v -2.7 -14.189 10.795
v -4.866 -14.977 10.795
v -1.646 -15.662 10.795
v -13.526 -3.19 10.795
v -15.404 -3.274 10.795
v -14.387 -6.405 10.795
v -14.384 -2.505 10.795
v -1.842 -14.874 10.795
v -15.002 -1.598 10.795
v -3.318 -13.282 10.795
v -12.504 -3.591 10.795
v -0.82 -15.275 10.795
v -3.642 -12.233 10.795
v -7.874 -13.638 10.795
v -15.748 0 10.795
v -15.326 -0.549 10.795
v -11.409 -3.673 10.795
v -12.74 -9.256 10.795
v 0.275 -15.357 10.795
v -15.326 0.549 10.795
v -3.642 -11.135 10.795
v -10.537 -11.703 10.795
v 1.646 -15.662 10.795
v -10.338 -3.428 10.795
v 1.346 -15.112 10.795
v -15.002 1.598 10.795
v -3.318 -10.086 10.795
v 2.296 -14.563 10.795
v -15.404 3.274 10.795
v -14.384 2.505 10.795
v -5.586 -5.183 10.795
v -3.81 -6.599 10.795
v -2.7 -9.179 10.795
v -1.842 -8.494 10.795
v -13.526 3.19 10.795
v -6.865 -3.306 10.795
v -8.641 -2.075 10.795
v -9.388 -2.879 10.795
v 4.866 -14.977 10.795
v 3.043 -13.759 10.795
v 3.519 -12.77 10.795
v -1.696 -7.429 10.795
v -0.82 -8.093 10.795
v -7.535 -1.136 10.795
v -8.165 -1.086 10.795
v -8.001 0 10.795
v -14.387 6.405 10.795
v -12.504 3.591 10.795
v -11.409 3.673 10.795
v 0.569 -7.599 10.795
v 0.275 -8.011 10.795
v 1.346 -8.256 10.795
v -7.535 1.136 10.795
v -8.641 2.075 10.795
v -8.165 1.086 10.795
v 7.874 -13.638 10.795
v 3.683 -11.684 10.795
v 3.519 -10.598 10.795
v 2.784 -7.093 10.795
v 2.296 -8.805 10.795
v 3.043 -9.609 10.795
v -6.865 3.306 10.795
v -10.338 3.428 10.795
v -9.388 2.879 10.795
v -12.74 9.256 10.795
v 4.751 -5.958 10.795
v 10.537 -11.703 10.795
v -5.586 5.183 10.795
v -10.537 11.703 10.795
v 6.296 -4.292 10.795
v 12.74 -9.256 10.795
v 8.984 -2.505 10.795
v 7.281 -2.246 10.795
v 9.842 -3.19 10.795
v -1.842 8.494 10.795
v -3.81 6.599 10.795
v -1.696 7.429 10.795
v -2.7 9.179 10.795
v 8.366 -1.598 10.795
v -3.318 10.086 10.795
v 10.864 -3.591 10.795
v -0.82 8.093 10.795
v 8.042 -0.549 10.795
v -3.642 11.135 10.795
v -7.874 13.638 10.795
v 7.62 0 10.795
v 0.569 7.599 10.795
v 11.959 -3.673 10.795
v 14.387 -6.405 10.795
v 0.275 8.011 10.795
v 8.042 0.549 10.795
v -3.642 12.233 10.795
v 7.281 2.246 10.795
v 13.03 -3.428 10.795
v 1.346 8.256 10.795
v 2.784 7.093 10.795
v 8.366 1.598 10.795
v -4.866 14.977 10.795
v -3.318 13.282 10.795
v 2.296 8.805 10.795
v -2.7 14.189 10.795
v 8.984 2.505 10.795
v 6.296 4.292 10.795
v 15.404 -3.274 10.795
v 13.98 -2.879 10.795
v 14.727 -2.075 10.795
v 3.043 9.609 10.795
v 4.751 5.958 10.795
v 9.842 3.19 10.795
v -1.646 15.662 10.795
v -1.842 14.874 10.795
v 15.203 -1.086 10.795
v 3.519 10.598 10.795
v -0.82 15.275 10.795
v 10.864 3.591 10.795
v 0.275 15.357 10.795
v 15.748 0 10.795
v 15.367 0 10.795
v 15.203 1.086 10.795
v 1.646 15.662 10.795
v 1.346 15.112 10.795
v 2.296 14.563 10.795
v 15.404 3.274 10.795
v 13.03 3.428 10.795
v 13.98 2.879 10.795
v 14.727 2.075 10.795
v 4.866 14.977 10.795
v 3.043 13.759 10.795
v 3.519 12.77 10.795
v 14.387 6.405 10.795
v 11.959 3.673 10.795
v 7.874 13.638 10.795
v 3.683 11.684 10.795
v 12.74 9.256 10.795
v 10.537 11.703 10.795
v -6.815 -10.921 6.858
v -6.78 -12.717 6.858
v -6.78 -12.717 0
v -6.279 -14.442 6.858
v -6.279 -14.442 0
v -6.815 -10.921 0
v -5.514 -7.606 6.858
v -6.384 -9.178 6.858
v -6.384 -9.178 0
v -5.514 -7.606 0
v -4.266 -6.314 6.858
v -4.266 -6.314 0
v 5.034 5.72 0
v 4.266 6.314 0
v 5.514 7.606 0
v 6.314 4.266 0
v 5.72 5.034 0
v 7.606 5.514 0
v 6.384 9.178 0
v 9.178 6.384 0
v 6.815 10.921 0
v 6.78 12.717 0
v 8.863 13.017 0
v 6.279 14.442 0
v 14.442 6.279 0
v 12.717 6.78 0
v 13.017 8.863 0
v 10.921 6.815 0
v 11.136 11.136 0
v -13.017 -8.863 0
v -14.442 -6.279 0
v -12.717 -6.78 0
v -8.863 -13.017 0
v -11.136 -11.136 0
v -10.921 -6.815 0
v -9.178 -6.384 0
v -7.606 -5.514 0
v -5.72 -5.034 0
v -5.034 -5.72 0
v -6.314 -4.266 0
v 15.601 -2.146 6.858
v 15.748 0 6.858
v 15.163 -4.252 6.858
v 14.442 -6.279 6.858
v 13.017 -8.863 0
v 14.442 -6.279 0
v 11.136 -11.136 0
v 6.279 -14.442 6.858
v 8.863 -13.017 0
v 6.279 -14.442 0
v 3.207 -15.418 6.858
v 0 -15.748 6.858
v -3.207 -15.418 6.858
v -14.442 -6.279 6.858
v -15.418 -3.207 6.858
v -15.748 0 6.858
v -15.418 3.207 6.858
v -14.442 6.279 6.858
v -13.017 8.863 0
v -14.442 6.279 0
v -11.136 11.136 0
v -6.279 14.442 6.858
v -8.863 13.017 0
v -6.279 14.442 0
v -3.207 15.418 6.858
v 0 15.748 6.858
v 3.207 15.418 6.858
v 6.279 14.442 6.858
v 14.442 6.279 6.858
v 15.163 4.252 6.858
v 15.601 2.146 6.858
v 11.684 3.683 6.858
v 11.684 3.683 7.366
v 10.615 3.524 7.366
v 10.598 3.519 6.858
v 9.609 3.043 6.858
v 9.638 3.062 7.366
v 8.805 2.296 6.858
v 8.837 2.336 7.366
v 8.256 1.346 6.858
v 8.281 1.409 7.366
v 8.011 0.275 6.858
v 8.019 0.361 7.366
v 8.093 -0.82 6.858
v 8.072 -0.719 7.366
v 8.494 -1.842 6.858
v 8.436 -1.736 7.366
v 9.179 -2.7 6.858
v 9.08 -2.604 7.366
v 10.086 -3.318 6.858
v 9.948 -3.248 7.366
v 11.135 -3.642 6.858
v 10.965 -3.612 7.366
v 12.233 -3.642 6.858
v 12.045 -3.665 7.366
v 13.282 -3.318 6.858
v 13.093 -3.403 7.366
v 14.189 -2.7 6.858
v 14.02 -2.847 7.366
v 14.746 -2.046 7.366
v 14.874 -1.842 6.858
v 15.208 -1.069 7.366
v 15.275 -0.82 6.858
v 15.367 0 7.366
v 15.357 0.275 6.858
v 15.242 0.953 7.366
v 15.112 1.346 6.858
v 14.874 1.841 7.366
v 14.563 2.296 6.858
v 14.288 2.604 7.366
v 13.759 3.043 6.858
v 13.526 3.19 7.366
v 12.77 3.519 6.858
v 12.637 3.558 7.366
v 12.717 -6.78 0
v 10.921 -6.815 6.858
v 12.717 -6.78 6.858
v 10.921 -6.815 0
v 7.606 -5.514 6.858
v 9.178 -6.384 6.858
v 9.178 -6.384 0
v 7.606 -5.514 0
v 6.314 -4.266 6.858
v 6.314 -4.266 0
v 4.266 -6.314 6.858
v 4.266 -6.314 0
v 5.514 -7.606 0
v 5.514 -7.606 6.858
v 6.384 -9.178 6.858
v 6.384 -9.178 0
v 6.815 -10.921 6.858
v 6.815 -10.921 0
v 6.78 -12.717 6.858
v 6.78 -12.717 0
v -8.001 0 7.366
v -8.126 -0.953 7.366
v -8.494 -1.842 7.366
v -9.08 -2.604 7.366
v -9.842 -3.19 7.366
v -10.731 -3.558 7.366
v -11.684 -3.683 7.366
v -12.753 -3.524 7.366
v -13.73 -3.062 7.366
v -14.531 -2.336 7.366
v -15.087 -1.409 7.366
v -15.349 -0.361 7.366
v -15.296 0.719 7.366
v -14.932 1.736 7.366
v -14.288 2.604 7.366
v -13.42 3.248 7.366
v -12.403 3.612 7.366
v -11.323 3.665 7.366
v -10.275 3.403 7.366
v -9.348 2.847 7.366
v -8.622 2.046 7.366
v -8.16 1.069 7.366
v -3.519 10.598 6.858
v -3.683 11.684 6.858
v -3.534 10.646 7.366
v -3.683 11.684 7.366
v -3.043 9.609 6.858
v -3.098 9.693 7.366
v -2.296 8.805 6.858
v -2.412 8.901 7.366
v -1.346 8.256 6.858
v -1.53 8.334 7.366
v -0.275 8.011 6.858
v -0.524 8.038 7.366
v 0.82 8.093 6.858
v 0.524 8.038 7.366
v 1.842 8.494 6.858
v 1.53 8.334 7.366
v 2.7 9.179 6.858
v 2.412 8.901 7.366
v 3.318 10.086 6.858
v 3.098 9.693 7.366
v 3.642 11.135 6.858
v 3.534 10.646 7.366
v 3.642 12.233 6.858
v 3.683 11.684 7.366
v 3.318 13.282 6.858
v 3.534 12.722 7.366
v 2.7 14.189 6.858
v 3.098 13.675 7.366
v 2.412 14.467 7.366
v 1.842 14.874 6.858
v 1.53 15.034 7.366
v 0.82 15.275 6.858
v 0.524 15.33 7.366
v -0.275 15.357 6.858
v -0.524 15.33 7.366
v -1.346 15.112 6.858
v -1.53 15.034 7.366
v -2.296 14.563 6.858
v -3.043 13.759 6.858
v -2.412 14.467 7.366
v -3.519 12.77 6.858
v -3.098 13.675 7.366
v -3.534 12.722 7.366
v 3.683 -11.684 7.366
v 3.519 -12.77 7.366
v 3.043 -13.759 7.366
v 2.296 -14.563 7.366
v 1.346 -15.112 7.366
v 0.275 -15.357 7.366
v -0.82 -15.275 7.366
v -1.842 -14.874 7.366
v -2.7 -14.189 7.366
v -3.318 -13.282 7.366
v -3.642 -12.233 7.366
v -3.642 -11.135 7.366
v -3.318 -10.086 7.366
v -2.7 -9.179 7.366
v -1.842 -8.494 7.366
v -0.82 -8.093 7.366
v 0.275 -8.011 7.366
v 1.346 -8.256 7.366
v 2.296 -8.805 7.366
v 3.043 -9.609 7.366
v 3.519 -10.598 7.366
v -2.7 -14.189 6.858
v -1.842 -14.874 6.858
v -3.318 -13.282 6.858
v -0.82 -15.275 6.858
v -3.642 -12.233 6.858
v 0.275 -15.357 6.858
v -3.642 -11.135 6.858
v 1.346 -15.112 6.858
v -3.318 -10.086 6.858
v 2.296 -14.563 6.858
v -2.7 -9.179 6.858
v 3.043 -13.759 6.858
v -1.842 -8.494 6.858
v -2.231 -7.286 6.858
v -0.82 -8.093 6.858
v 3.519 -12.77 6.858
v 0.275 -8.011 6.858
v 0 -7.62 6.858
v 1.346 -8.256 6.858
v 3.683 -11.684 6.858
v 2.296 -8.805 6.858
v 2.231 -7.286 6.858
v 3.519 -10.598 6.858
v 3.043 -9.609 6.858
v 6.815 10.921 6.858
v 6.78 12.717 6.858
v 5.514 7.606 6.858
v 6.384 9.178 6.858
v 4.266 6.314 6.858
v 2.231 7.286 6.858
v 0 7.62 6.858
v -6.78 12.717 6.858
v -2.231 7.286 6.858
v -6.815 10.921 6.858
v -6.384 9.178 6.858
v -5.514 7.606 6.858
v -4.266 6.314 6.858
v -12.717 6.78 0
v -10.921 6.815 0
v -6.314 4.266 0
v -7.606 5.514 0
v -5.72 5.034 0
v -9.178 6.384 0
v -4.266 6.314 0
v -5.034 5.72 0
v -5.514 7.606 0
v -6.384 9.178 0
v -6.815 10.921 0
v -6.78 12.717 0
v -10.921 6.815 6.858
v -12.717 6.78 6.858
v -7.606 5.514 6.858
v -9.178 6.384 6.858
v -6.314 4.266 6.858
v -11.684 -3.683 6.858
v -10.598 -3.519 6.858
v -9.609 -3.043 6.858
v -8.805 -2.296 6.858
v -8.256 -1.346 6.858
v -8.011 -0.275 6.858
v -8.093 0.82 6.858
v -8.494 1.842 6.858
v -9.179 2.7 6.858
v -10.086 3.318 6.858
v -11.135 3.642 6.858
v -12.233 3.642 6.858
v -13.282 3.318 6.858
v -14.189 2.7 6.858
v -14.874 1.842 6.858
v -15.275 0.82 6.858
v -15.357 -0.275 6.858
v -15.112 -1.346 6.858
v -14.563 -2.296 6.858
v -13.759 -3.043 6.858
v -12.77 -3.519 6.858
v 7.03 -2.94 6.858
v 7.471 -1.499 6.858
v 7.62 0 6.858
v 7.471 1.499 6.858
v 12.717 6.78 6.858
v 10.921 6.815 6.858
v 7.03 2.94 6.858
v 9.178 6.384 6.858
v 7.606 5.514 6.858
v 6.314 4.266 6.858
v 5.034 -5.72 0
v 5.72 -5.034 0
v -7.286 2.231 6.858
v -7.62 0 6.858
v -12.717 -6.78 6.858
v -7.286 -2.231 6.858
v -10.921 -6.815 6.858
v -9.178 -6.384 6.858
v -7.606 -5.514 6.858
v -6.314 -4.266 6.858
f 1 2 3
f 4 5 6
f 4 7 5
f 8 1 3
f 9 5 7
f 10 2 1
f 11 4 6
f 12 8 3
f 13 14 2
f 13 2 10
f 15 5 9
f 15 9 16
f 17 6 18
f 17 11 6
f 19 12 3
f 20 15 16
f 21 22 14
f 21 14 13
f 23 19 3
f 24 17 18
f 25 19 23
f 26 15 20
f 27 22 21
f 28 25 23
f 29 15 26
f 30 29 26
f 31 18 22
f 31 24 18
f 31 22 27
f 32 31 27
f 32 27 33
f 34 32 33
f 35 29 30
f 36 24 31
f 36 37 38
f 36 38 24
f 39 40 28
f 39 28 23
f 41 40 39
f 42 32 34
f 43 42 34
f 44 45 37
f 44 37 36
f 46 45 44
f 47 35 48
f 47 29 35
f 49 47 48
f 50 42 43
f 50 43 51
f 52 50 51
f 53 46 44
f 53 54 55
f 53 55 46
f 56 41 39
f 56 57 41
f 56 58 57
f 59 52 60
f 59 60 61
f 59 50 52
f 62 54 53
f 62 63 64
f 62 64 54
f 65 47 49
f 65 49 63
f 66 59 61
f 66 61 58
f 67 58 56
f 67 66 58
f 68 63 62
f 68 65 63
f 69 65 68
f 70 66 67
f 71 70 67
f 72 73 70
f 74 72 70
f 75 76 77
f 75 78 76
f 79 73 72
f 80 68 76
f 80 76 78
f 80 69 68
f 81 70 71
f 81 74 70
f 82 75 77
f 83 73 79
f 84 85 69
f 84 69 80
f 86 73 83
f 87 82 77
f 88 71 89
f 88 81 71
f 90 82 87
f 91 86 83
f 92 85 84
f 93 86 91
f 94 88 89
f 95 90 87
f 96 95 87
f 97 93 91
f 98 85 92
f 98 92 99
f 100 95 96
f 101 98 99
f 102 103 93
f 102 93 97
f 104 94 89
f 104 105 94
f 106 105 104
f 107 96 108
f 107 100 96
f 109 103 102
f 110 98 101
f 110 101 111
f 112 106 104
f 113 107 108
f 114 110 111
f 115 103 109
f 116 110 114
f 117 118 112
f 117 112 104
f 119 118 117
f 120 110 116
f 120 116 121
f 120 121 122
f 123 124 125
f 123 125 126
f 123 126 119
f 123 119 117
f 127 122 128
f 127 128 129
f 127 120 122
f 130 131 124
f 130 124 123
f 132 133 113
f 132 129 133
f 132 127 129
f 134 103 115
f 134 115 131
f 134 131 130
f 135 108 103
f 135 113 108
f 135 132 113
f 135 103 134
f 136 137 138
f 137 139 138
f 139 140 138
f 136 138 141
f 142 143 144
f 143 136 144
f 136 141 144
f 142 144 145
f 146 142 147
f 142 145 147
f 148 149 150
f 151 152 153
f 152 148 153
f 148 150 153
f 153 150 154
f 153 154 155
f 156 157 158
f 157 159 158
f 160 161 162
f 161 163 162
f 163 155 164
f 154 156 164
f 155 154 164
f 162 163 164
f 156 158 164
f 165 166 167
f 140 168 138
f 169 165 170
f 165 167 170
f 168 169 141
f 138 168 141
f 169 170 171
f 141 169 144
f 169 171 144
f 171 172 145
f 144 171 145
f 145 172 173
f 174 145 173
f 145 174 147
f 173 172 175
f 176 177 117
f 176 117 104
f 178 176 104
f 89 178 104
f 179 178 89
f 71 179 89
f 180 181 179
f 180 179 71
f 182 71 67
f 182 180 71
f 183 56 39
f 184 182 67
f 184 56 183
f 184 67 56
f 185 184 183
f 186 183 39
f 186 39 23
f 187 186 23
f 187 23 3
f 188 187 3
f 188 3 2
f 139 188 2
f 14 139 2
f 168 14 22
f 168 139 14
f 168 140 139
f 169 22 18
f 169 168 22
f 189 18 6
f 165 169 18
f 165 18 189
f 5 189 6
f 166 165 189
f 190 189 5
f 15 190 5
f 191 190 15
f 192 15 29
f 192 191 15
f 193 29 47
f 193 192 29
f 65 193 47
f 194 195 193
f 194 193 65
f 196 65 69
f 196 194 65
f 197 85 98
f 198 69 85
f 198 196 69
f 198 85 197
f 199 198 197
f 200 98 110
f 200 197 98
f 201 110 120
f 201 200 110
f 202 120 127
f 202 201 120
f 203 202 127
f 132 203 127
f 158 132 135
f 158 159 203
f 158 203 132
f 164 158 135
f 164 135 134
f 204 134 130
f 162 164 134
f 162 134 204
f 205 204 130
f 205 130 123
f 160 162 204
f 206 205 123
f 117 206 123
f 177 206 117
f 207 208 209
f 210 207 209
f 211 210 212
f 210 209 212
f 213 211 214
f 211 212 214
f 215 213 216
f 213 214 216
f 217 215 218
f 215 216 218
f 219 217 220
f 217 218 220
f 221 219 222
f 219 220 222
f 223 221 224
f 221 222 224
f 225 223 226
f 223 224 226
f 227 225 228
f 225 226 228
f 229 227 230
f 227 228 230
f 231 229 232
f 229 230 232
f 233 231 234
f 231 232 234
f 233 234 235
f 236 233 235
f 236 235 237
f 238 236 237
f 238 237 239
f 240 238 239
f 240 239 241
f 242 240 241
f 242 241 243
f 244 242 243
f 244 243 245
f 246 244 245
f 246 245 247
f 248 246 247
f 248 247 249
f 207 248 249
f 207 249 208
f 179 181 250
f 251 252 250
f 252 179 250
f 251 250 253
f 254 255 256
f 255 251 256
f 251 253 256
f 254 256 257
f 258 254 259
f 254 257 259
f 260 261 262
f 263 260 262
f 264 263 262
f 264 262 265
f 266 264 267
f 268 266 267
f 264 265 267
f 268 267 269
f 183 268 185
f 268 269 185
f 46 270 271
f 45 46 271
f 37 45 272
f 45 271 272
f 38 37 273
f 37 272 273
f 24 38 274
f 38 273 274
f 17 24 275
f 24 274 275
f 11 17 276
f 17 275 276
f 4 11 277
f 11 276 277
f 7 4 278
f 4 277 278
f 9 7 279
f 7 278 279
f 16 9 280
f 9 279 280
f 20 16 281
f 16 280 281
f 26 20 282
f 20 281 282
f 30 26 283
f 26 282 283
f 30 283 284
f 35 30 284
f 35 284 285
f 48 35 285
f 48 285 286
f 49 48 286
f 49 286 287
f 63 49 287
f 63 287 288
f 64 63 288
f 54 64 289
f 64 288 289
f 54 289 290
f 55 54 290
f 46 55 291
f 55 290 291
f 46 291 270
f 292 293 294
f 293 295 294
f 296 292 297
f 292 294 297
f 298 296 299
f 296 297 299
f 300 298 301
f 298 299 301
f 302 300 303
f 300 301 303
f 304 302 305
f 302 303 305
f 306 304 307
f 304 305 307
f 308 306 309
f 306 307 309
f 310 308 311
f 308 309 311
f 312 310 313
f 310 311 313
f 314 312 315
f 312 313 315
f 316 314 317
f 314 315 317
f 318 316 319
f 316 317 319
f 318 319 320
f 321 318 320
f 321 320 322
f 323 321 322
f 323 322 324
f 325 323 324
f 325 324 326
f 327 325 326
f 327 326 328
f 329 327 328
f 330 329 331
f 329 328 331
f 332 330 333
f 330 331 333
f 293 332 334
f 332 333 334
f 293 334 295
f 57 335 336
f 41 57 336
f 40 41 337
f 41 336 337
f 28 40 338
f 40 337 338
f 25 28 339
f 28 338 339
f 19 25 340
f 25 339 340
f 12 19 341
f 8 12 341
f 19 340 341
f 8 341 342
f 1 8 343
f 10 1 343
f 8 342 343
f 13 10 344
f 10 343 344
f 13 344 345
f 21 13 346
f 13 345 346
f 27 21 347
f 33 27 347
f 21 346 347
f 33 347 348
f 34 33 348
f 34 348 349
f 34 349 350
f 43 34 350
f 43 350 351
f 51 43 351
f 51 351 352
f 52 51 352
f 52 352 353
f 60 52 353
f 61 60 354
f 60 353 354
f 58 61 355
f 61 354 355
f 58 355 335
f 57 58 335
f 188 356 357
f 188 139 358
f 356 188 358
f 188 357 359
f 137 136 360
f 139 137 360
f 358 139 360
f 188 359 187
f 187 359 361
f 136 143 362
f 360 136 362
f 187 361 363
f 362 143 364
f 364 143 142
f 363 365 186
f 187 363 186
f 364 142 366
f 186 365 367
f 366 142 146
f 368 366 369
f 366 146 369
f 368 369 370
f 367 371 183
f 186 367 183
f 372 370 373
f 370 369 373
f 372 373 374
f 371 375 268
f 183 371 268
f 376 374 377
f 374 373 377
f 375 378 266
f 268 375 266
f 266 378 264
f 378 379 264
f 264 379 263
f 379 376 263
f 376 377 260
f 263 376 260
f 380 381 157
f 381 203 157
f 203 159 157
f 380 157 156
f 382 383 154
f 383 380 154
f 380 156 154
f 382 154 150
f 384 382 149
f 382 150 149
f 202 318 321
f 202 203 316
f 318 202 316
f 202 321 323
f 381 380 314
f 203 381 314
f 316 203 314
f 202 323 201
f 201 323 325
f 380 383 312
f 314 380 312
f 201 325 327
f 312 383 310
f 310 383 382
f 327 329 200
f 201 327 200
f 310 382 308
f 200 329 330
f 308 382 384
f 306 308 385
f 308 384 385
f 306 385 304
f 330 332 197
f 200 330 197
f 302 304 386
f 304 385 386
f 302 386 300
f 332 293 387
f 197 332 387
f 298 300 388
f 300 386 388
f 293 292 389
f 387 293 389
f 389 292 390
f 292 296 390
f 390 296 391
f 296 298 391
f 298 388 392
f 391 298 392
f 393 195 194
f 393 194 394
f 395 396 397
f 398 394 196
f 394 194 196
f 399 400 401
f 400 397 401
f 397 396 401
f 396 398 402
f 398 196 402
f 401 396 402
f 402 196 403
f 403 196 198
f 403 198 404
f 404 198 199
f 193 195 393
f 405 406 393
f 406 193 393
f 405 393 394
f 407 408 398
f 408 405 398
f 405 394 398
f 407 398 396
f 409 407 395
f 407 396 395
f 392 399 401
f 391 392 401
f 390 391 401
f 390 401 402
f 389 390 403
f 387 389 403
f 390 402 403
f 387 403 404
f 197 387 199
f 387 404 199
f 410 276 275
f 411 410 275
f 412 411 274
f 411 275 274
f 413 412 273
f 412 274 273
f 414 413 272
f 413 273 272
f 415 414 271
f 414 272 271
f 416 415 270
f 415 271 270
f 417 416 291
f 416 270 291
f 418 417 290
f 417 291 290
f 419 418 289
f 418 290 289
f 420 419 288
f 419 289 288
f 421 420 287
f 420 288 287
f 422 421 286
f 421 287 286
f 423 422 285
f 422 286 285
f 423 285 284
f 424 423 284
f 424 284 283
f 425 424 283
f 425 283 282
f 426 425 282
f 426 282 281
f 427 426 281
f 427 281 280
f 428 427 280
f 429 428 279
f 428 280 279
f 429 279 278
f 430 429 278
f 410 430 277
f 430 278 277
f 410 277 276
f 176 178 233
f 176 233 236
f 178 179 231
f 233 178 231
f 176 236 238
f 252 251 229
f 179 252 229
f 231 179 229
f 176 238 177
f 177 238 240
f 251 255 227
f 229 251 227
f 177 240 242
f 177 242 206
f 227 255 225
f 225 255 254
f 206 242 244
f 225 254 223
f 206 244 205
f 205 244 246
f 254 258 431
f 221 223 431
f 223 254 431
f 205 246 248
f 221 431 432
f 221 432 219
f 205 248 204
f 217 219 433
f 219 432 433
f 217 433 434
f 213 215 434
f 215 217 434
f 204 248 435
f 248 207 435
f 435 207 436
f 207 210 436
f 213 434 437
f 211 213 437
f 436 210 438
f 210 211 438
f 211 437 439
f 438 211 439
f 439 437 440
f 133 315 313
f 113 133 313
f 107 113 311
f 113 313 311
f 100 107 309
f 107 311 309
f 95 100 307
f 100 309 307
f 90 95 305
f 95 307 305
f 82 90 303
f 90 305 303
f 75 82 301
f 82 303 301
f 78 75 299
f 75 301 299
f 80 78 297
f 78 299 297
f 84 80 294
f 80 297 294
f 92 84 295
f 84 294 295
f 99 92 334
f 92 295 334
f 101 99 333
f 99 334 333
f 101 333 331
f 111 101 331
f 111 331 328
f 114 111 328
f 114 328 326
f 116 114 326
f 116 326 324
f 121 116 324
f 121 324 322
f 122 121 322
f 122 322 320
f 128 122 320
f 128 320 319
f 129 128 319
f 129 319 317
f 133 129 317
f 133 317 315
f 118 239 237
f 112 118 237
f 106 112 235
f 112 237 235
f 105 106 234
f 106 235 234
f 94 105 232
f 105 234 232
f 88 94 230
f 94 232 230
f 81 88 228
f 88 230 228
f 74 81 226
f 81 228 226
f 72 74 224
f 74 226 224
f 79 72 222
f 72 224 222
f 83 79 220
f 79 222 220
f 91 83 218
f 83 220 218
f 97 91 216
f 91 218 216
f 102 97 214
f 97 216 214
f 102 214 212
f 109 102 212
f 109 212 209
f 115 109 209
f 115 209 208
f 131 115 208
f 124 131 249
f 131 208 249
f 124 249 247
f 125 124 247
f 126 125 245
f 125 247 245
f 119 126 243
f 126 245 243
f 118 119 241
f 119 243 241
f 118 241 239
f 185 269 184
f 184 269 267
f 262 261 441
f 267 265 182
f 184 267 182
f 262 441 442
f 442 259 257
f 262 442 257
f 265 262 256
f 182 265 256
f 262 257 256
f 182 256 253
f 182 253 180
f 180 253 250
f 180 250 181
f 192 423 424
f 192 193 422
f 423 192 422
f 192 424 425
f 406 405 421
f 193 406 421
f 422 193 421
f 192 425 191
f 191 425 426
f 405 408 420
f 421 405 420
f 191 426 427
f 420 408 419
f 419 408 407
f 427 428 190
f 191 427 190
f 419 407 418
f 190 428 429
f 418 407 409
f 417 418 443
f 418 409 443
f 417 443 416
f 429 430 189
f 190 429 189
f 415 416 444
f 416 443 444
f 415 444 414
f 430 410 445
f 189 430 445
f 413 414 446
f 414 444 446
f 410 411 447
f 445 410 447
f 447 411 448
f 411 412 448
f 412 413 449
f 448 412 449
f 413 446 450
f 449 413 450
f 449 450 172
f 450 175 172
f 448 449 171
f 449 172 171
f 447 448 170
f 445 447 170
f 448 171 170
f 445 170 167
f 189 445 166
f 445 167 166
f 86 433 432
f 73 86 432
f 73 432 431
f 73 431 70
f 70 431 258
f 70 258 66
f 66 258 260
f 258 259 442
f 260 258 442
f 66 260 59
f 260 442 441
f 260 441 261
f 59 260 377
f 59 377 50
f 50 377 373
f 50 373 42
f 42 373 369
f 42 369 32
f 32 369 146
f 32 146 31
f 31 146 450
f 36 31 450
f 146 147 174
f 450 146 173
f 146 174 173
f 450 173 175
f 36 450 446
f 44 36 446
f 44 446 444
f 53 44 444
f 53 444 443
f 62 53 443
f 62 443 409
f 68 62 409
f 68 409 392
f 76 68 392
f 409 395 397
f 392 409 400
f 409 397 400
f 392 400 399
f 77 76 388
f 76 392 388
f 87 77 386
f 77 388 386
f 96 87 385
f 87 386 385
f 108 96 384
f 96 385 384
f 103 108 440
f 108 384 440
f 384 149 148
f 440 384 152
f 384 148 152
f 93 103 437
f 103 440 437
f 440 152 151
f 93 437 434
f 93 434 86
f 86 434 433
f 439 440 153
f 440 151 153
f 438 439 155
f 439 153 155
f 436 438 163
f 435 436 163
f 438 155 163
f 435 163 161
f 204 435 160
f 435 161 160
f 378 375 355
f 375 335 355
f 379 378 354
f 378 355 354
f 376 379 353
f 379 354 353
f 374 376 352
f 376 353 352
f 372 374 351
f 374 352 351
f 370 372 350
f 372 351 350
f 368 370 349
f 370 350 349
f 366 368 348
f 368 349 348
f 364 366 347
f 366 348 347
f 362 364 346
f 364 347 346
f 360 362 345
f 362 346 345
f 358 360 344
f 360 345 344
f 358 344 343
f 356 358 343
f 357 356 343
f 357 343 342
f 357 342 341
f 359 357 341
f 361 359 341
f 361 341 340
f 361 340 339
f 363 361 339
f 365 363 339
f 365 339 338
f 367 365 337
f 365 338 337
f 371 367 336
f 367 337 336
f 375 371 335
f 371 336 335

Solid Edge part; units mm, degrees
sketch "Sketch1" plane through (0, 0, 0) normal (0, 0, 1) x (1, 0, 0)
  circle A0 centre (0, 0) radius 15.748
  circle A1 centre (0, 0) radius 7.62
extrude "Protrusion1" add sketch "Sketch1" along normal blind 7.366
sketch "Sketch2" plane through (0, 0, 0) normal (0, 0, 1) x (1, 0, 0)
  circle A0 centre (0, -11.684) radius 6.858
extrude "ExtrudedCutout_1" cut sketch "Sketch2" along normal blind 6.858
sketch "Sketch3" plane through (0, 0, 7.366) normal (0, 0, 1) x (1, 0, 0)
  circle A0 centre (0, -11.684) radius 3.683
extrude "ExtrudedCutout_3" cut sketch "Sketch3" against normal blind 7.0384
pattern_circular "Pattern1" count 4 over 360 about axis through (0, 0, 7.366) along (0, 0, 1) of "ExtrudedCutout_1", "ExtrudedCutout_3"
sketch "Sketch4" plane through (0, 0, 7.366) normal (0, 0, 1) x (1, 0, 0)
  circle A0 centre (0, 0) radius 7.62
  circle A1 centre (-11.684, 0) radius 3.683
  circle A2 centre (0, 11.684) radius 3.683
  circle A3 centre (11.684, 0) radius 3.683
  circle A4 centre (0, -11.684) radius 3.683
  circle A5 centre (0, 0) radius 15.748
extrude "ExtrudedProtrusion_5" add sketch "Sketch4" along normal blind 9.779
sketch "Sketch5" plane through (0, 0, 17.145) normal (0, 0, 1) x (1, 0, 0)
  circle A0 centre (0, 0) radius 19.2555
extrude "ExtrudedCutout_4" cut sketch "Sketch5" against normal blind 6.35
